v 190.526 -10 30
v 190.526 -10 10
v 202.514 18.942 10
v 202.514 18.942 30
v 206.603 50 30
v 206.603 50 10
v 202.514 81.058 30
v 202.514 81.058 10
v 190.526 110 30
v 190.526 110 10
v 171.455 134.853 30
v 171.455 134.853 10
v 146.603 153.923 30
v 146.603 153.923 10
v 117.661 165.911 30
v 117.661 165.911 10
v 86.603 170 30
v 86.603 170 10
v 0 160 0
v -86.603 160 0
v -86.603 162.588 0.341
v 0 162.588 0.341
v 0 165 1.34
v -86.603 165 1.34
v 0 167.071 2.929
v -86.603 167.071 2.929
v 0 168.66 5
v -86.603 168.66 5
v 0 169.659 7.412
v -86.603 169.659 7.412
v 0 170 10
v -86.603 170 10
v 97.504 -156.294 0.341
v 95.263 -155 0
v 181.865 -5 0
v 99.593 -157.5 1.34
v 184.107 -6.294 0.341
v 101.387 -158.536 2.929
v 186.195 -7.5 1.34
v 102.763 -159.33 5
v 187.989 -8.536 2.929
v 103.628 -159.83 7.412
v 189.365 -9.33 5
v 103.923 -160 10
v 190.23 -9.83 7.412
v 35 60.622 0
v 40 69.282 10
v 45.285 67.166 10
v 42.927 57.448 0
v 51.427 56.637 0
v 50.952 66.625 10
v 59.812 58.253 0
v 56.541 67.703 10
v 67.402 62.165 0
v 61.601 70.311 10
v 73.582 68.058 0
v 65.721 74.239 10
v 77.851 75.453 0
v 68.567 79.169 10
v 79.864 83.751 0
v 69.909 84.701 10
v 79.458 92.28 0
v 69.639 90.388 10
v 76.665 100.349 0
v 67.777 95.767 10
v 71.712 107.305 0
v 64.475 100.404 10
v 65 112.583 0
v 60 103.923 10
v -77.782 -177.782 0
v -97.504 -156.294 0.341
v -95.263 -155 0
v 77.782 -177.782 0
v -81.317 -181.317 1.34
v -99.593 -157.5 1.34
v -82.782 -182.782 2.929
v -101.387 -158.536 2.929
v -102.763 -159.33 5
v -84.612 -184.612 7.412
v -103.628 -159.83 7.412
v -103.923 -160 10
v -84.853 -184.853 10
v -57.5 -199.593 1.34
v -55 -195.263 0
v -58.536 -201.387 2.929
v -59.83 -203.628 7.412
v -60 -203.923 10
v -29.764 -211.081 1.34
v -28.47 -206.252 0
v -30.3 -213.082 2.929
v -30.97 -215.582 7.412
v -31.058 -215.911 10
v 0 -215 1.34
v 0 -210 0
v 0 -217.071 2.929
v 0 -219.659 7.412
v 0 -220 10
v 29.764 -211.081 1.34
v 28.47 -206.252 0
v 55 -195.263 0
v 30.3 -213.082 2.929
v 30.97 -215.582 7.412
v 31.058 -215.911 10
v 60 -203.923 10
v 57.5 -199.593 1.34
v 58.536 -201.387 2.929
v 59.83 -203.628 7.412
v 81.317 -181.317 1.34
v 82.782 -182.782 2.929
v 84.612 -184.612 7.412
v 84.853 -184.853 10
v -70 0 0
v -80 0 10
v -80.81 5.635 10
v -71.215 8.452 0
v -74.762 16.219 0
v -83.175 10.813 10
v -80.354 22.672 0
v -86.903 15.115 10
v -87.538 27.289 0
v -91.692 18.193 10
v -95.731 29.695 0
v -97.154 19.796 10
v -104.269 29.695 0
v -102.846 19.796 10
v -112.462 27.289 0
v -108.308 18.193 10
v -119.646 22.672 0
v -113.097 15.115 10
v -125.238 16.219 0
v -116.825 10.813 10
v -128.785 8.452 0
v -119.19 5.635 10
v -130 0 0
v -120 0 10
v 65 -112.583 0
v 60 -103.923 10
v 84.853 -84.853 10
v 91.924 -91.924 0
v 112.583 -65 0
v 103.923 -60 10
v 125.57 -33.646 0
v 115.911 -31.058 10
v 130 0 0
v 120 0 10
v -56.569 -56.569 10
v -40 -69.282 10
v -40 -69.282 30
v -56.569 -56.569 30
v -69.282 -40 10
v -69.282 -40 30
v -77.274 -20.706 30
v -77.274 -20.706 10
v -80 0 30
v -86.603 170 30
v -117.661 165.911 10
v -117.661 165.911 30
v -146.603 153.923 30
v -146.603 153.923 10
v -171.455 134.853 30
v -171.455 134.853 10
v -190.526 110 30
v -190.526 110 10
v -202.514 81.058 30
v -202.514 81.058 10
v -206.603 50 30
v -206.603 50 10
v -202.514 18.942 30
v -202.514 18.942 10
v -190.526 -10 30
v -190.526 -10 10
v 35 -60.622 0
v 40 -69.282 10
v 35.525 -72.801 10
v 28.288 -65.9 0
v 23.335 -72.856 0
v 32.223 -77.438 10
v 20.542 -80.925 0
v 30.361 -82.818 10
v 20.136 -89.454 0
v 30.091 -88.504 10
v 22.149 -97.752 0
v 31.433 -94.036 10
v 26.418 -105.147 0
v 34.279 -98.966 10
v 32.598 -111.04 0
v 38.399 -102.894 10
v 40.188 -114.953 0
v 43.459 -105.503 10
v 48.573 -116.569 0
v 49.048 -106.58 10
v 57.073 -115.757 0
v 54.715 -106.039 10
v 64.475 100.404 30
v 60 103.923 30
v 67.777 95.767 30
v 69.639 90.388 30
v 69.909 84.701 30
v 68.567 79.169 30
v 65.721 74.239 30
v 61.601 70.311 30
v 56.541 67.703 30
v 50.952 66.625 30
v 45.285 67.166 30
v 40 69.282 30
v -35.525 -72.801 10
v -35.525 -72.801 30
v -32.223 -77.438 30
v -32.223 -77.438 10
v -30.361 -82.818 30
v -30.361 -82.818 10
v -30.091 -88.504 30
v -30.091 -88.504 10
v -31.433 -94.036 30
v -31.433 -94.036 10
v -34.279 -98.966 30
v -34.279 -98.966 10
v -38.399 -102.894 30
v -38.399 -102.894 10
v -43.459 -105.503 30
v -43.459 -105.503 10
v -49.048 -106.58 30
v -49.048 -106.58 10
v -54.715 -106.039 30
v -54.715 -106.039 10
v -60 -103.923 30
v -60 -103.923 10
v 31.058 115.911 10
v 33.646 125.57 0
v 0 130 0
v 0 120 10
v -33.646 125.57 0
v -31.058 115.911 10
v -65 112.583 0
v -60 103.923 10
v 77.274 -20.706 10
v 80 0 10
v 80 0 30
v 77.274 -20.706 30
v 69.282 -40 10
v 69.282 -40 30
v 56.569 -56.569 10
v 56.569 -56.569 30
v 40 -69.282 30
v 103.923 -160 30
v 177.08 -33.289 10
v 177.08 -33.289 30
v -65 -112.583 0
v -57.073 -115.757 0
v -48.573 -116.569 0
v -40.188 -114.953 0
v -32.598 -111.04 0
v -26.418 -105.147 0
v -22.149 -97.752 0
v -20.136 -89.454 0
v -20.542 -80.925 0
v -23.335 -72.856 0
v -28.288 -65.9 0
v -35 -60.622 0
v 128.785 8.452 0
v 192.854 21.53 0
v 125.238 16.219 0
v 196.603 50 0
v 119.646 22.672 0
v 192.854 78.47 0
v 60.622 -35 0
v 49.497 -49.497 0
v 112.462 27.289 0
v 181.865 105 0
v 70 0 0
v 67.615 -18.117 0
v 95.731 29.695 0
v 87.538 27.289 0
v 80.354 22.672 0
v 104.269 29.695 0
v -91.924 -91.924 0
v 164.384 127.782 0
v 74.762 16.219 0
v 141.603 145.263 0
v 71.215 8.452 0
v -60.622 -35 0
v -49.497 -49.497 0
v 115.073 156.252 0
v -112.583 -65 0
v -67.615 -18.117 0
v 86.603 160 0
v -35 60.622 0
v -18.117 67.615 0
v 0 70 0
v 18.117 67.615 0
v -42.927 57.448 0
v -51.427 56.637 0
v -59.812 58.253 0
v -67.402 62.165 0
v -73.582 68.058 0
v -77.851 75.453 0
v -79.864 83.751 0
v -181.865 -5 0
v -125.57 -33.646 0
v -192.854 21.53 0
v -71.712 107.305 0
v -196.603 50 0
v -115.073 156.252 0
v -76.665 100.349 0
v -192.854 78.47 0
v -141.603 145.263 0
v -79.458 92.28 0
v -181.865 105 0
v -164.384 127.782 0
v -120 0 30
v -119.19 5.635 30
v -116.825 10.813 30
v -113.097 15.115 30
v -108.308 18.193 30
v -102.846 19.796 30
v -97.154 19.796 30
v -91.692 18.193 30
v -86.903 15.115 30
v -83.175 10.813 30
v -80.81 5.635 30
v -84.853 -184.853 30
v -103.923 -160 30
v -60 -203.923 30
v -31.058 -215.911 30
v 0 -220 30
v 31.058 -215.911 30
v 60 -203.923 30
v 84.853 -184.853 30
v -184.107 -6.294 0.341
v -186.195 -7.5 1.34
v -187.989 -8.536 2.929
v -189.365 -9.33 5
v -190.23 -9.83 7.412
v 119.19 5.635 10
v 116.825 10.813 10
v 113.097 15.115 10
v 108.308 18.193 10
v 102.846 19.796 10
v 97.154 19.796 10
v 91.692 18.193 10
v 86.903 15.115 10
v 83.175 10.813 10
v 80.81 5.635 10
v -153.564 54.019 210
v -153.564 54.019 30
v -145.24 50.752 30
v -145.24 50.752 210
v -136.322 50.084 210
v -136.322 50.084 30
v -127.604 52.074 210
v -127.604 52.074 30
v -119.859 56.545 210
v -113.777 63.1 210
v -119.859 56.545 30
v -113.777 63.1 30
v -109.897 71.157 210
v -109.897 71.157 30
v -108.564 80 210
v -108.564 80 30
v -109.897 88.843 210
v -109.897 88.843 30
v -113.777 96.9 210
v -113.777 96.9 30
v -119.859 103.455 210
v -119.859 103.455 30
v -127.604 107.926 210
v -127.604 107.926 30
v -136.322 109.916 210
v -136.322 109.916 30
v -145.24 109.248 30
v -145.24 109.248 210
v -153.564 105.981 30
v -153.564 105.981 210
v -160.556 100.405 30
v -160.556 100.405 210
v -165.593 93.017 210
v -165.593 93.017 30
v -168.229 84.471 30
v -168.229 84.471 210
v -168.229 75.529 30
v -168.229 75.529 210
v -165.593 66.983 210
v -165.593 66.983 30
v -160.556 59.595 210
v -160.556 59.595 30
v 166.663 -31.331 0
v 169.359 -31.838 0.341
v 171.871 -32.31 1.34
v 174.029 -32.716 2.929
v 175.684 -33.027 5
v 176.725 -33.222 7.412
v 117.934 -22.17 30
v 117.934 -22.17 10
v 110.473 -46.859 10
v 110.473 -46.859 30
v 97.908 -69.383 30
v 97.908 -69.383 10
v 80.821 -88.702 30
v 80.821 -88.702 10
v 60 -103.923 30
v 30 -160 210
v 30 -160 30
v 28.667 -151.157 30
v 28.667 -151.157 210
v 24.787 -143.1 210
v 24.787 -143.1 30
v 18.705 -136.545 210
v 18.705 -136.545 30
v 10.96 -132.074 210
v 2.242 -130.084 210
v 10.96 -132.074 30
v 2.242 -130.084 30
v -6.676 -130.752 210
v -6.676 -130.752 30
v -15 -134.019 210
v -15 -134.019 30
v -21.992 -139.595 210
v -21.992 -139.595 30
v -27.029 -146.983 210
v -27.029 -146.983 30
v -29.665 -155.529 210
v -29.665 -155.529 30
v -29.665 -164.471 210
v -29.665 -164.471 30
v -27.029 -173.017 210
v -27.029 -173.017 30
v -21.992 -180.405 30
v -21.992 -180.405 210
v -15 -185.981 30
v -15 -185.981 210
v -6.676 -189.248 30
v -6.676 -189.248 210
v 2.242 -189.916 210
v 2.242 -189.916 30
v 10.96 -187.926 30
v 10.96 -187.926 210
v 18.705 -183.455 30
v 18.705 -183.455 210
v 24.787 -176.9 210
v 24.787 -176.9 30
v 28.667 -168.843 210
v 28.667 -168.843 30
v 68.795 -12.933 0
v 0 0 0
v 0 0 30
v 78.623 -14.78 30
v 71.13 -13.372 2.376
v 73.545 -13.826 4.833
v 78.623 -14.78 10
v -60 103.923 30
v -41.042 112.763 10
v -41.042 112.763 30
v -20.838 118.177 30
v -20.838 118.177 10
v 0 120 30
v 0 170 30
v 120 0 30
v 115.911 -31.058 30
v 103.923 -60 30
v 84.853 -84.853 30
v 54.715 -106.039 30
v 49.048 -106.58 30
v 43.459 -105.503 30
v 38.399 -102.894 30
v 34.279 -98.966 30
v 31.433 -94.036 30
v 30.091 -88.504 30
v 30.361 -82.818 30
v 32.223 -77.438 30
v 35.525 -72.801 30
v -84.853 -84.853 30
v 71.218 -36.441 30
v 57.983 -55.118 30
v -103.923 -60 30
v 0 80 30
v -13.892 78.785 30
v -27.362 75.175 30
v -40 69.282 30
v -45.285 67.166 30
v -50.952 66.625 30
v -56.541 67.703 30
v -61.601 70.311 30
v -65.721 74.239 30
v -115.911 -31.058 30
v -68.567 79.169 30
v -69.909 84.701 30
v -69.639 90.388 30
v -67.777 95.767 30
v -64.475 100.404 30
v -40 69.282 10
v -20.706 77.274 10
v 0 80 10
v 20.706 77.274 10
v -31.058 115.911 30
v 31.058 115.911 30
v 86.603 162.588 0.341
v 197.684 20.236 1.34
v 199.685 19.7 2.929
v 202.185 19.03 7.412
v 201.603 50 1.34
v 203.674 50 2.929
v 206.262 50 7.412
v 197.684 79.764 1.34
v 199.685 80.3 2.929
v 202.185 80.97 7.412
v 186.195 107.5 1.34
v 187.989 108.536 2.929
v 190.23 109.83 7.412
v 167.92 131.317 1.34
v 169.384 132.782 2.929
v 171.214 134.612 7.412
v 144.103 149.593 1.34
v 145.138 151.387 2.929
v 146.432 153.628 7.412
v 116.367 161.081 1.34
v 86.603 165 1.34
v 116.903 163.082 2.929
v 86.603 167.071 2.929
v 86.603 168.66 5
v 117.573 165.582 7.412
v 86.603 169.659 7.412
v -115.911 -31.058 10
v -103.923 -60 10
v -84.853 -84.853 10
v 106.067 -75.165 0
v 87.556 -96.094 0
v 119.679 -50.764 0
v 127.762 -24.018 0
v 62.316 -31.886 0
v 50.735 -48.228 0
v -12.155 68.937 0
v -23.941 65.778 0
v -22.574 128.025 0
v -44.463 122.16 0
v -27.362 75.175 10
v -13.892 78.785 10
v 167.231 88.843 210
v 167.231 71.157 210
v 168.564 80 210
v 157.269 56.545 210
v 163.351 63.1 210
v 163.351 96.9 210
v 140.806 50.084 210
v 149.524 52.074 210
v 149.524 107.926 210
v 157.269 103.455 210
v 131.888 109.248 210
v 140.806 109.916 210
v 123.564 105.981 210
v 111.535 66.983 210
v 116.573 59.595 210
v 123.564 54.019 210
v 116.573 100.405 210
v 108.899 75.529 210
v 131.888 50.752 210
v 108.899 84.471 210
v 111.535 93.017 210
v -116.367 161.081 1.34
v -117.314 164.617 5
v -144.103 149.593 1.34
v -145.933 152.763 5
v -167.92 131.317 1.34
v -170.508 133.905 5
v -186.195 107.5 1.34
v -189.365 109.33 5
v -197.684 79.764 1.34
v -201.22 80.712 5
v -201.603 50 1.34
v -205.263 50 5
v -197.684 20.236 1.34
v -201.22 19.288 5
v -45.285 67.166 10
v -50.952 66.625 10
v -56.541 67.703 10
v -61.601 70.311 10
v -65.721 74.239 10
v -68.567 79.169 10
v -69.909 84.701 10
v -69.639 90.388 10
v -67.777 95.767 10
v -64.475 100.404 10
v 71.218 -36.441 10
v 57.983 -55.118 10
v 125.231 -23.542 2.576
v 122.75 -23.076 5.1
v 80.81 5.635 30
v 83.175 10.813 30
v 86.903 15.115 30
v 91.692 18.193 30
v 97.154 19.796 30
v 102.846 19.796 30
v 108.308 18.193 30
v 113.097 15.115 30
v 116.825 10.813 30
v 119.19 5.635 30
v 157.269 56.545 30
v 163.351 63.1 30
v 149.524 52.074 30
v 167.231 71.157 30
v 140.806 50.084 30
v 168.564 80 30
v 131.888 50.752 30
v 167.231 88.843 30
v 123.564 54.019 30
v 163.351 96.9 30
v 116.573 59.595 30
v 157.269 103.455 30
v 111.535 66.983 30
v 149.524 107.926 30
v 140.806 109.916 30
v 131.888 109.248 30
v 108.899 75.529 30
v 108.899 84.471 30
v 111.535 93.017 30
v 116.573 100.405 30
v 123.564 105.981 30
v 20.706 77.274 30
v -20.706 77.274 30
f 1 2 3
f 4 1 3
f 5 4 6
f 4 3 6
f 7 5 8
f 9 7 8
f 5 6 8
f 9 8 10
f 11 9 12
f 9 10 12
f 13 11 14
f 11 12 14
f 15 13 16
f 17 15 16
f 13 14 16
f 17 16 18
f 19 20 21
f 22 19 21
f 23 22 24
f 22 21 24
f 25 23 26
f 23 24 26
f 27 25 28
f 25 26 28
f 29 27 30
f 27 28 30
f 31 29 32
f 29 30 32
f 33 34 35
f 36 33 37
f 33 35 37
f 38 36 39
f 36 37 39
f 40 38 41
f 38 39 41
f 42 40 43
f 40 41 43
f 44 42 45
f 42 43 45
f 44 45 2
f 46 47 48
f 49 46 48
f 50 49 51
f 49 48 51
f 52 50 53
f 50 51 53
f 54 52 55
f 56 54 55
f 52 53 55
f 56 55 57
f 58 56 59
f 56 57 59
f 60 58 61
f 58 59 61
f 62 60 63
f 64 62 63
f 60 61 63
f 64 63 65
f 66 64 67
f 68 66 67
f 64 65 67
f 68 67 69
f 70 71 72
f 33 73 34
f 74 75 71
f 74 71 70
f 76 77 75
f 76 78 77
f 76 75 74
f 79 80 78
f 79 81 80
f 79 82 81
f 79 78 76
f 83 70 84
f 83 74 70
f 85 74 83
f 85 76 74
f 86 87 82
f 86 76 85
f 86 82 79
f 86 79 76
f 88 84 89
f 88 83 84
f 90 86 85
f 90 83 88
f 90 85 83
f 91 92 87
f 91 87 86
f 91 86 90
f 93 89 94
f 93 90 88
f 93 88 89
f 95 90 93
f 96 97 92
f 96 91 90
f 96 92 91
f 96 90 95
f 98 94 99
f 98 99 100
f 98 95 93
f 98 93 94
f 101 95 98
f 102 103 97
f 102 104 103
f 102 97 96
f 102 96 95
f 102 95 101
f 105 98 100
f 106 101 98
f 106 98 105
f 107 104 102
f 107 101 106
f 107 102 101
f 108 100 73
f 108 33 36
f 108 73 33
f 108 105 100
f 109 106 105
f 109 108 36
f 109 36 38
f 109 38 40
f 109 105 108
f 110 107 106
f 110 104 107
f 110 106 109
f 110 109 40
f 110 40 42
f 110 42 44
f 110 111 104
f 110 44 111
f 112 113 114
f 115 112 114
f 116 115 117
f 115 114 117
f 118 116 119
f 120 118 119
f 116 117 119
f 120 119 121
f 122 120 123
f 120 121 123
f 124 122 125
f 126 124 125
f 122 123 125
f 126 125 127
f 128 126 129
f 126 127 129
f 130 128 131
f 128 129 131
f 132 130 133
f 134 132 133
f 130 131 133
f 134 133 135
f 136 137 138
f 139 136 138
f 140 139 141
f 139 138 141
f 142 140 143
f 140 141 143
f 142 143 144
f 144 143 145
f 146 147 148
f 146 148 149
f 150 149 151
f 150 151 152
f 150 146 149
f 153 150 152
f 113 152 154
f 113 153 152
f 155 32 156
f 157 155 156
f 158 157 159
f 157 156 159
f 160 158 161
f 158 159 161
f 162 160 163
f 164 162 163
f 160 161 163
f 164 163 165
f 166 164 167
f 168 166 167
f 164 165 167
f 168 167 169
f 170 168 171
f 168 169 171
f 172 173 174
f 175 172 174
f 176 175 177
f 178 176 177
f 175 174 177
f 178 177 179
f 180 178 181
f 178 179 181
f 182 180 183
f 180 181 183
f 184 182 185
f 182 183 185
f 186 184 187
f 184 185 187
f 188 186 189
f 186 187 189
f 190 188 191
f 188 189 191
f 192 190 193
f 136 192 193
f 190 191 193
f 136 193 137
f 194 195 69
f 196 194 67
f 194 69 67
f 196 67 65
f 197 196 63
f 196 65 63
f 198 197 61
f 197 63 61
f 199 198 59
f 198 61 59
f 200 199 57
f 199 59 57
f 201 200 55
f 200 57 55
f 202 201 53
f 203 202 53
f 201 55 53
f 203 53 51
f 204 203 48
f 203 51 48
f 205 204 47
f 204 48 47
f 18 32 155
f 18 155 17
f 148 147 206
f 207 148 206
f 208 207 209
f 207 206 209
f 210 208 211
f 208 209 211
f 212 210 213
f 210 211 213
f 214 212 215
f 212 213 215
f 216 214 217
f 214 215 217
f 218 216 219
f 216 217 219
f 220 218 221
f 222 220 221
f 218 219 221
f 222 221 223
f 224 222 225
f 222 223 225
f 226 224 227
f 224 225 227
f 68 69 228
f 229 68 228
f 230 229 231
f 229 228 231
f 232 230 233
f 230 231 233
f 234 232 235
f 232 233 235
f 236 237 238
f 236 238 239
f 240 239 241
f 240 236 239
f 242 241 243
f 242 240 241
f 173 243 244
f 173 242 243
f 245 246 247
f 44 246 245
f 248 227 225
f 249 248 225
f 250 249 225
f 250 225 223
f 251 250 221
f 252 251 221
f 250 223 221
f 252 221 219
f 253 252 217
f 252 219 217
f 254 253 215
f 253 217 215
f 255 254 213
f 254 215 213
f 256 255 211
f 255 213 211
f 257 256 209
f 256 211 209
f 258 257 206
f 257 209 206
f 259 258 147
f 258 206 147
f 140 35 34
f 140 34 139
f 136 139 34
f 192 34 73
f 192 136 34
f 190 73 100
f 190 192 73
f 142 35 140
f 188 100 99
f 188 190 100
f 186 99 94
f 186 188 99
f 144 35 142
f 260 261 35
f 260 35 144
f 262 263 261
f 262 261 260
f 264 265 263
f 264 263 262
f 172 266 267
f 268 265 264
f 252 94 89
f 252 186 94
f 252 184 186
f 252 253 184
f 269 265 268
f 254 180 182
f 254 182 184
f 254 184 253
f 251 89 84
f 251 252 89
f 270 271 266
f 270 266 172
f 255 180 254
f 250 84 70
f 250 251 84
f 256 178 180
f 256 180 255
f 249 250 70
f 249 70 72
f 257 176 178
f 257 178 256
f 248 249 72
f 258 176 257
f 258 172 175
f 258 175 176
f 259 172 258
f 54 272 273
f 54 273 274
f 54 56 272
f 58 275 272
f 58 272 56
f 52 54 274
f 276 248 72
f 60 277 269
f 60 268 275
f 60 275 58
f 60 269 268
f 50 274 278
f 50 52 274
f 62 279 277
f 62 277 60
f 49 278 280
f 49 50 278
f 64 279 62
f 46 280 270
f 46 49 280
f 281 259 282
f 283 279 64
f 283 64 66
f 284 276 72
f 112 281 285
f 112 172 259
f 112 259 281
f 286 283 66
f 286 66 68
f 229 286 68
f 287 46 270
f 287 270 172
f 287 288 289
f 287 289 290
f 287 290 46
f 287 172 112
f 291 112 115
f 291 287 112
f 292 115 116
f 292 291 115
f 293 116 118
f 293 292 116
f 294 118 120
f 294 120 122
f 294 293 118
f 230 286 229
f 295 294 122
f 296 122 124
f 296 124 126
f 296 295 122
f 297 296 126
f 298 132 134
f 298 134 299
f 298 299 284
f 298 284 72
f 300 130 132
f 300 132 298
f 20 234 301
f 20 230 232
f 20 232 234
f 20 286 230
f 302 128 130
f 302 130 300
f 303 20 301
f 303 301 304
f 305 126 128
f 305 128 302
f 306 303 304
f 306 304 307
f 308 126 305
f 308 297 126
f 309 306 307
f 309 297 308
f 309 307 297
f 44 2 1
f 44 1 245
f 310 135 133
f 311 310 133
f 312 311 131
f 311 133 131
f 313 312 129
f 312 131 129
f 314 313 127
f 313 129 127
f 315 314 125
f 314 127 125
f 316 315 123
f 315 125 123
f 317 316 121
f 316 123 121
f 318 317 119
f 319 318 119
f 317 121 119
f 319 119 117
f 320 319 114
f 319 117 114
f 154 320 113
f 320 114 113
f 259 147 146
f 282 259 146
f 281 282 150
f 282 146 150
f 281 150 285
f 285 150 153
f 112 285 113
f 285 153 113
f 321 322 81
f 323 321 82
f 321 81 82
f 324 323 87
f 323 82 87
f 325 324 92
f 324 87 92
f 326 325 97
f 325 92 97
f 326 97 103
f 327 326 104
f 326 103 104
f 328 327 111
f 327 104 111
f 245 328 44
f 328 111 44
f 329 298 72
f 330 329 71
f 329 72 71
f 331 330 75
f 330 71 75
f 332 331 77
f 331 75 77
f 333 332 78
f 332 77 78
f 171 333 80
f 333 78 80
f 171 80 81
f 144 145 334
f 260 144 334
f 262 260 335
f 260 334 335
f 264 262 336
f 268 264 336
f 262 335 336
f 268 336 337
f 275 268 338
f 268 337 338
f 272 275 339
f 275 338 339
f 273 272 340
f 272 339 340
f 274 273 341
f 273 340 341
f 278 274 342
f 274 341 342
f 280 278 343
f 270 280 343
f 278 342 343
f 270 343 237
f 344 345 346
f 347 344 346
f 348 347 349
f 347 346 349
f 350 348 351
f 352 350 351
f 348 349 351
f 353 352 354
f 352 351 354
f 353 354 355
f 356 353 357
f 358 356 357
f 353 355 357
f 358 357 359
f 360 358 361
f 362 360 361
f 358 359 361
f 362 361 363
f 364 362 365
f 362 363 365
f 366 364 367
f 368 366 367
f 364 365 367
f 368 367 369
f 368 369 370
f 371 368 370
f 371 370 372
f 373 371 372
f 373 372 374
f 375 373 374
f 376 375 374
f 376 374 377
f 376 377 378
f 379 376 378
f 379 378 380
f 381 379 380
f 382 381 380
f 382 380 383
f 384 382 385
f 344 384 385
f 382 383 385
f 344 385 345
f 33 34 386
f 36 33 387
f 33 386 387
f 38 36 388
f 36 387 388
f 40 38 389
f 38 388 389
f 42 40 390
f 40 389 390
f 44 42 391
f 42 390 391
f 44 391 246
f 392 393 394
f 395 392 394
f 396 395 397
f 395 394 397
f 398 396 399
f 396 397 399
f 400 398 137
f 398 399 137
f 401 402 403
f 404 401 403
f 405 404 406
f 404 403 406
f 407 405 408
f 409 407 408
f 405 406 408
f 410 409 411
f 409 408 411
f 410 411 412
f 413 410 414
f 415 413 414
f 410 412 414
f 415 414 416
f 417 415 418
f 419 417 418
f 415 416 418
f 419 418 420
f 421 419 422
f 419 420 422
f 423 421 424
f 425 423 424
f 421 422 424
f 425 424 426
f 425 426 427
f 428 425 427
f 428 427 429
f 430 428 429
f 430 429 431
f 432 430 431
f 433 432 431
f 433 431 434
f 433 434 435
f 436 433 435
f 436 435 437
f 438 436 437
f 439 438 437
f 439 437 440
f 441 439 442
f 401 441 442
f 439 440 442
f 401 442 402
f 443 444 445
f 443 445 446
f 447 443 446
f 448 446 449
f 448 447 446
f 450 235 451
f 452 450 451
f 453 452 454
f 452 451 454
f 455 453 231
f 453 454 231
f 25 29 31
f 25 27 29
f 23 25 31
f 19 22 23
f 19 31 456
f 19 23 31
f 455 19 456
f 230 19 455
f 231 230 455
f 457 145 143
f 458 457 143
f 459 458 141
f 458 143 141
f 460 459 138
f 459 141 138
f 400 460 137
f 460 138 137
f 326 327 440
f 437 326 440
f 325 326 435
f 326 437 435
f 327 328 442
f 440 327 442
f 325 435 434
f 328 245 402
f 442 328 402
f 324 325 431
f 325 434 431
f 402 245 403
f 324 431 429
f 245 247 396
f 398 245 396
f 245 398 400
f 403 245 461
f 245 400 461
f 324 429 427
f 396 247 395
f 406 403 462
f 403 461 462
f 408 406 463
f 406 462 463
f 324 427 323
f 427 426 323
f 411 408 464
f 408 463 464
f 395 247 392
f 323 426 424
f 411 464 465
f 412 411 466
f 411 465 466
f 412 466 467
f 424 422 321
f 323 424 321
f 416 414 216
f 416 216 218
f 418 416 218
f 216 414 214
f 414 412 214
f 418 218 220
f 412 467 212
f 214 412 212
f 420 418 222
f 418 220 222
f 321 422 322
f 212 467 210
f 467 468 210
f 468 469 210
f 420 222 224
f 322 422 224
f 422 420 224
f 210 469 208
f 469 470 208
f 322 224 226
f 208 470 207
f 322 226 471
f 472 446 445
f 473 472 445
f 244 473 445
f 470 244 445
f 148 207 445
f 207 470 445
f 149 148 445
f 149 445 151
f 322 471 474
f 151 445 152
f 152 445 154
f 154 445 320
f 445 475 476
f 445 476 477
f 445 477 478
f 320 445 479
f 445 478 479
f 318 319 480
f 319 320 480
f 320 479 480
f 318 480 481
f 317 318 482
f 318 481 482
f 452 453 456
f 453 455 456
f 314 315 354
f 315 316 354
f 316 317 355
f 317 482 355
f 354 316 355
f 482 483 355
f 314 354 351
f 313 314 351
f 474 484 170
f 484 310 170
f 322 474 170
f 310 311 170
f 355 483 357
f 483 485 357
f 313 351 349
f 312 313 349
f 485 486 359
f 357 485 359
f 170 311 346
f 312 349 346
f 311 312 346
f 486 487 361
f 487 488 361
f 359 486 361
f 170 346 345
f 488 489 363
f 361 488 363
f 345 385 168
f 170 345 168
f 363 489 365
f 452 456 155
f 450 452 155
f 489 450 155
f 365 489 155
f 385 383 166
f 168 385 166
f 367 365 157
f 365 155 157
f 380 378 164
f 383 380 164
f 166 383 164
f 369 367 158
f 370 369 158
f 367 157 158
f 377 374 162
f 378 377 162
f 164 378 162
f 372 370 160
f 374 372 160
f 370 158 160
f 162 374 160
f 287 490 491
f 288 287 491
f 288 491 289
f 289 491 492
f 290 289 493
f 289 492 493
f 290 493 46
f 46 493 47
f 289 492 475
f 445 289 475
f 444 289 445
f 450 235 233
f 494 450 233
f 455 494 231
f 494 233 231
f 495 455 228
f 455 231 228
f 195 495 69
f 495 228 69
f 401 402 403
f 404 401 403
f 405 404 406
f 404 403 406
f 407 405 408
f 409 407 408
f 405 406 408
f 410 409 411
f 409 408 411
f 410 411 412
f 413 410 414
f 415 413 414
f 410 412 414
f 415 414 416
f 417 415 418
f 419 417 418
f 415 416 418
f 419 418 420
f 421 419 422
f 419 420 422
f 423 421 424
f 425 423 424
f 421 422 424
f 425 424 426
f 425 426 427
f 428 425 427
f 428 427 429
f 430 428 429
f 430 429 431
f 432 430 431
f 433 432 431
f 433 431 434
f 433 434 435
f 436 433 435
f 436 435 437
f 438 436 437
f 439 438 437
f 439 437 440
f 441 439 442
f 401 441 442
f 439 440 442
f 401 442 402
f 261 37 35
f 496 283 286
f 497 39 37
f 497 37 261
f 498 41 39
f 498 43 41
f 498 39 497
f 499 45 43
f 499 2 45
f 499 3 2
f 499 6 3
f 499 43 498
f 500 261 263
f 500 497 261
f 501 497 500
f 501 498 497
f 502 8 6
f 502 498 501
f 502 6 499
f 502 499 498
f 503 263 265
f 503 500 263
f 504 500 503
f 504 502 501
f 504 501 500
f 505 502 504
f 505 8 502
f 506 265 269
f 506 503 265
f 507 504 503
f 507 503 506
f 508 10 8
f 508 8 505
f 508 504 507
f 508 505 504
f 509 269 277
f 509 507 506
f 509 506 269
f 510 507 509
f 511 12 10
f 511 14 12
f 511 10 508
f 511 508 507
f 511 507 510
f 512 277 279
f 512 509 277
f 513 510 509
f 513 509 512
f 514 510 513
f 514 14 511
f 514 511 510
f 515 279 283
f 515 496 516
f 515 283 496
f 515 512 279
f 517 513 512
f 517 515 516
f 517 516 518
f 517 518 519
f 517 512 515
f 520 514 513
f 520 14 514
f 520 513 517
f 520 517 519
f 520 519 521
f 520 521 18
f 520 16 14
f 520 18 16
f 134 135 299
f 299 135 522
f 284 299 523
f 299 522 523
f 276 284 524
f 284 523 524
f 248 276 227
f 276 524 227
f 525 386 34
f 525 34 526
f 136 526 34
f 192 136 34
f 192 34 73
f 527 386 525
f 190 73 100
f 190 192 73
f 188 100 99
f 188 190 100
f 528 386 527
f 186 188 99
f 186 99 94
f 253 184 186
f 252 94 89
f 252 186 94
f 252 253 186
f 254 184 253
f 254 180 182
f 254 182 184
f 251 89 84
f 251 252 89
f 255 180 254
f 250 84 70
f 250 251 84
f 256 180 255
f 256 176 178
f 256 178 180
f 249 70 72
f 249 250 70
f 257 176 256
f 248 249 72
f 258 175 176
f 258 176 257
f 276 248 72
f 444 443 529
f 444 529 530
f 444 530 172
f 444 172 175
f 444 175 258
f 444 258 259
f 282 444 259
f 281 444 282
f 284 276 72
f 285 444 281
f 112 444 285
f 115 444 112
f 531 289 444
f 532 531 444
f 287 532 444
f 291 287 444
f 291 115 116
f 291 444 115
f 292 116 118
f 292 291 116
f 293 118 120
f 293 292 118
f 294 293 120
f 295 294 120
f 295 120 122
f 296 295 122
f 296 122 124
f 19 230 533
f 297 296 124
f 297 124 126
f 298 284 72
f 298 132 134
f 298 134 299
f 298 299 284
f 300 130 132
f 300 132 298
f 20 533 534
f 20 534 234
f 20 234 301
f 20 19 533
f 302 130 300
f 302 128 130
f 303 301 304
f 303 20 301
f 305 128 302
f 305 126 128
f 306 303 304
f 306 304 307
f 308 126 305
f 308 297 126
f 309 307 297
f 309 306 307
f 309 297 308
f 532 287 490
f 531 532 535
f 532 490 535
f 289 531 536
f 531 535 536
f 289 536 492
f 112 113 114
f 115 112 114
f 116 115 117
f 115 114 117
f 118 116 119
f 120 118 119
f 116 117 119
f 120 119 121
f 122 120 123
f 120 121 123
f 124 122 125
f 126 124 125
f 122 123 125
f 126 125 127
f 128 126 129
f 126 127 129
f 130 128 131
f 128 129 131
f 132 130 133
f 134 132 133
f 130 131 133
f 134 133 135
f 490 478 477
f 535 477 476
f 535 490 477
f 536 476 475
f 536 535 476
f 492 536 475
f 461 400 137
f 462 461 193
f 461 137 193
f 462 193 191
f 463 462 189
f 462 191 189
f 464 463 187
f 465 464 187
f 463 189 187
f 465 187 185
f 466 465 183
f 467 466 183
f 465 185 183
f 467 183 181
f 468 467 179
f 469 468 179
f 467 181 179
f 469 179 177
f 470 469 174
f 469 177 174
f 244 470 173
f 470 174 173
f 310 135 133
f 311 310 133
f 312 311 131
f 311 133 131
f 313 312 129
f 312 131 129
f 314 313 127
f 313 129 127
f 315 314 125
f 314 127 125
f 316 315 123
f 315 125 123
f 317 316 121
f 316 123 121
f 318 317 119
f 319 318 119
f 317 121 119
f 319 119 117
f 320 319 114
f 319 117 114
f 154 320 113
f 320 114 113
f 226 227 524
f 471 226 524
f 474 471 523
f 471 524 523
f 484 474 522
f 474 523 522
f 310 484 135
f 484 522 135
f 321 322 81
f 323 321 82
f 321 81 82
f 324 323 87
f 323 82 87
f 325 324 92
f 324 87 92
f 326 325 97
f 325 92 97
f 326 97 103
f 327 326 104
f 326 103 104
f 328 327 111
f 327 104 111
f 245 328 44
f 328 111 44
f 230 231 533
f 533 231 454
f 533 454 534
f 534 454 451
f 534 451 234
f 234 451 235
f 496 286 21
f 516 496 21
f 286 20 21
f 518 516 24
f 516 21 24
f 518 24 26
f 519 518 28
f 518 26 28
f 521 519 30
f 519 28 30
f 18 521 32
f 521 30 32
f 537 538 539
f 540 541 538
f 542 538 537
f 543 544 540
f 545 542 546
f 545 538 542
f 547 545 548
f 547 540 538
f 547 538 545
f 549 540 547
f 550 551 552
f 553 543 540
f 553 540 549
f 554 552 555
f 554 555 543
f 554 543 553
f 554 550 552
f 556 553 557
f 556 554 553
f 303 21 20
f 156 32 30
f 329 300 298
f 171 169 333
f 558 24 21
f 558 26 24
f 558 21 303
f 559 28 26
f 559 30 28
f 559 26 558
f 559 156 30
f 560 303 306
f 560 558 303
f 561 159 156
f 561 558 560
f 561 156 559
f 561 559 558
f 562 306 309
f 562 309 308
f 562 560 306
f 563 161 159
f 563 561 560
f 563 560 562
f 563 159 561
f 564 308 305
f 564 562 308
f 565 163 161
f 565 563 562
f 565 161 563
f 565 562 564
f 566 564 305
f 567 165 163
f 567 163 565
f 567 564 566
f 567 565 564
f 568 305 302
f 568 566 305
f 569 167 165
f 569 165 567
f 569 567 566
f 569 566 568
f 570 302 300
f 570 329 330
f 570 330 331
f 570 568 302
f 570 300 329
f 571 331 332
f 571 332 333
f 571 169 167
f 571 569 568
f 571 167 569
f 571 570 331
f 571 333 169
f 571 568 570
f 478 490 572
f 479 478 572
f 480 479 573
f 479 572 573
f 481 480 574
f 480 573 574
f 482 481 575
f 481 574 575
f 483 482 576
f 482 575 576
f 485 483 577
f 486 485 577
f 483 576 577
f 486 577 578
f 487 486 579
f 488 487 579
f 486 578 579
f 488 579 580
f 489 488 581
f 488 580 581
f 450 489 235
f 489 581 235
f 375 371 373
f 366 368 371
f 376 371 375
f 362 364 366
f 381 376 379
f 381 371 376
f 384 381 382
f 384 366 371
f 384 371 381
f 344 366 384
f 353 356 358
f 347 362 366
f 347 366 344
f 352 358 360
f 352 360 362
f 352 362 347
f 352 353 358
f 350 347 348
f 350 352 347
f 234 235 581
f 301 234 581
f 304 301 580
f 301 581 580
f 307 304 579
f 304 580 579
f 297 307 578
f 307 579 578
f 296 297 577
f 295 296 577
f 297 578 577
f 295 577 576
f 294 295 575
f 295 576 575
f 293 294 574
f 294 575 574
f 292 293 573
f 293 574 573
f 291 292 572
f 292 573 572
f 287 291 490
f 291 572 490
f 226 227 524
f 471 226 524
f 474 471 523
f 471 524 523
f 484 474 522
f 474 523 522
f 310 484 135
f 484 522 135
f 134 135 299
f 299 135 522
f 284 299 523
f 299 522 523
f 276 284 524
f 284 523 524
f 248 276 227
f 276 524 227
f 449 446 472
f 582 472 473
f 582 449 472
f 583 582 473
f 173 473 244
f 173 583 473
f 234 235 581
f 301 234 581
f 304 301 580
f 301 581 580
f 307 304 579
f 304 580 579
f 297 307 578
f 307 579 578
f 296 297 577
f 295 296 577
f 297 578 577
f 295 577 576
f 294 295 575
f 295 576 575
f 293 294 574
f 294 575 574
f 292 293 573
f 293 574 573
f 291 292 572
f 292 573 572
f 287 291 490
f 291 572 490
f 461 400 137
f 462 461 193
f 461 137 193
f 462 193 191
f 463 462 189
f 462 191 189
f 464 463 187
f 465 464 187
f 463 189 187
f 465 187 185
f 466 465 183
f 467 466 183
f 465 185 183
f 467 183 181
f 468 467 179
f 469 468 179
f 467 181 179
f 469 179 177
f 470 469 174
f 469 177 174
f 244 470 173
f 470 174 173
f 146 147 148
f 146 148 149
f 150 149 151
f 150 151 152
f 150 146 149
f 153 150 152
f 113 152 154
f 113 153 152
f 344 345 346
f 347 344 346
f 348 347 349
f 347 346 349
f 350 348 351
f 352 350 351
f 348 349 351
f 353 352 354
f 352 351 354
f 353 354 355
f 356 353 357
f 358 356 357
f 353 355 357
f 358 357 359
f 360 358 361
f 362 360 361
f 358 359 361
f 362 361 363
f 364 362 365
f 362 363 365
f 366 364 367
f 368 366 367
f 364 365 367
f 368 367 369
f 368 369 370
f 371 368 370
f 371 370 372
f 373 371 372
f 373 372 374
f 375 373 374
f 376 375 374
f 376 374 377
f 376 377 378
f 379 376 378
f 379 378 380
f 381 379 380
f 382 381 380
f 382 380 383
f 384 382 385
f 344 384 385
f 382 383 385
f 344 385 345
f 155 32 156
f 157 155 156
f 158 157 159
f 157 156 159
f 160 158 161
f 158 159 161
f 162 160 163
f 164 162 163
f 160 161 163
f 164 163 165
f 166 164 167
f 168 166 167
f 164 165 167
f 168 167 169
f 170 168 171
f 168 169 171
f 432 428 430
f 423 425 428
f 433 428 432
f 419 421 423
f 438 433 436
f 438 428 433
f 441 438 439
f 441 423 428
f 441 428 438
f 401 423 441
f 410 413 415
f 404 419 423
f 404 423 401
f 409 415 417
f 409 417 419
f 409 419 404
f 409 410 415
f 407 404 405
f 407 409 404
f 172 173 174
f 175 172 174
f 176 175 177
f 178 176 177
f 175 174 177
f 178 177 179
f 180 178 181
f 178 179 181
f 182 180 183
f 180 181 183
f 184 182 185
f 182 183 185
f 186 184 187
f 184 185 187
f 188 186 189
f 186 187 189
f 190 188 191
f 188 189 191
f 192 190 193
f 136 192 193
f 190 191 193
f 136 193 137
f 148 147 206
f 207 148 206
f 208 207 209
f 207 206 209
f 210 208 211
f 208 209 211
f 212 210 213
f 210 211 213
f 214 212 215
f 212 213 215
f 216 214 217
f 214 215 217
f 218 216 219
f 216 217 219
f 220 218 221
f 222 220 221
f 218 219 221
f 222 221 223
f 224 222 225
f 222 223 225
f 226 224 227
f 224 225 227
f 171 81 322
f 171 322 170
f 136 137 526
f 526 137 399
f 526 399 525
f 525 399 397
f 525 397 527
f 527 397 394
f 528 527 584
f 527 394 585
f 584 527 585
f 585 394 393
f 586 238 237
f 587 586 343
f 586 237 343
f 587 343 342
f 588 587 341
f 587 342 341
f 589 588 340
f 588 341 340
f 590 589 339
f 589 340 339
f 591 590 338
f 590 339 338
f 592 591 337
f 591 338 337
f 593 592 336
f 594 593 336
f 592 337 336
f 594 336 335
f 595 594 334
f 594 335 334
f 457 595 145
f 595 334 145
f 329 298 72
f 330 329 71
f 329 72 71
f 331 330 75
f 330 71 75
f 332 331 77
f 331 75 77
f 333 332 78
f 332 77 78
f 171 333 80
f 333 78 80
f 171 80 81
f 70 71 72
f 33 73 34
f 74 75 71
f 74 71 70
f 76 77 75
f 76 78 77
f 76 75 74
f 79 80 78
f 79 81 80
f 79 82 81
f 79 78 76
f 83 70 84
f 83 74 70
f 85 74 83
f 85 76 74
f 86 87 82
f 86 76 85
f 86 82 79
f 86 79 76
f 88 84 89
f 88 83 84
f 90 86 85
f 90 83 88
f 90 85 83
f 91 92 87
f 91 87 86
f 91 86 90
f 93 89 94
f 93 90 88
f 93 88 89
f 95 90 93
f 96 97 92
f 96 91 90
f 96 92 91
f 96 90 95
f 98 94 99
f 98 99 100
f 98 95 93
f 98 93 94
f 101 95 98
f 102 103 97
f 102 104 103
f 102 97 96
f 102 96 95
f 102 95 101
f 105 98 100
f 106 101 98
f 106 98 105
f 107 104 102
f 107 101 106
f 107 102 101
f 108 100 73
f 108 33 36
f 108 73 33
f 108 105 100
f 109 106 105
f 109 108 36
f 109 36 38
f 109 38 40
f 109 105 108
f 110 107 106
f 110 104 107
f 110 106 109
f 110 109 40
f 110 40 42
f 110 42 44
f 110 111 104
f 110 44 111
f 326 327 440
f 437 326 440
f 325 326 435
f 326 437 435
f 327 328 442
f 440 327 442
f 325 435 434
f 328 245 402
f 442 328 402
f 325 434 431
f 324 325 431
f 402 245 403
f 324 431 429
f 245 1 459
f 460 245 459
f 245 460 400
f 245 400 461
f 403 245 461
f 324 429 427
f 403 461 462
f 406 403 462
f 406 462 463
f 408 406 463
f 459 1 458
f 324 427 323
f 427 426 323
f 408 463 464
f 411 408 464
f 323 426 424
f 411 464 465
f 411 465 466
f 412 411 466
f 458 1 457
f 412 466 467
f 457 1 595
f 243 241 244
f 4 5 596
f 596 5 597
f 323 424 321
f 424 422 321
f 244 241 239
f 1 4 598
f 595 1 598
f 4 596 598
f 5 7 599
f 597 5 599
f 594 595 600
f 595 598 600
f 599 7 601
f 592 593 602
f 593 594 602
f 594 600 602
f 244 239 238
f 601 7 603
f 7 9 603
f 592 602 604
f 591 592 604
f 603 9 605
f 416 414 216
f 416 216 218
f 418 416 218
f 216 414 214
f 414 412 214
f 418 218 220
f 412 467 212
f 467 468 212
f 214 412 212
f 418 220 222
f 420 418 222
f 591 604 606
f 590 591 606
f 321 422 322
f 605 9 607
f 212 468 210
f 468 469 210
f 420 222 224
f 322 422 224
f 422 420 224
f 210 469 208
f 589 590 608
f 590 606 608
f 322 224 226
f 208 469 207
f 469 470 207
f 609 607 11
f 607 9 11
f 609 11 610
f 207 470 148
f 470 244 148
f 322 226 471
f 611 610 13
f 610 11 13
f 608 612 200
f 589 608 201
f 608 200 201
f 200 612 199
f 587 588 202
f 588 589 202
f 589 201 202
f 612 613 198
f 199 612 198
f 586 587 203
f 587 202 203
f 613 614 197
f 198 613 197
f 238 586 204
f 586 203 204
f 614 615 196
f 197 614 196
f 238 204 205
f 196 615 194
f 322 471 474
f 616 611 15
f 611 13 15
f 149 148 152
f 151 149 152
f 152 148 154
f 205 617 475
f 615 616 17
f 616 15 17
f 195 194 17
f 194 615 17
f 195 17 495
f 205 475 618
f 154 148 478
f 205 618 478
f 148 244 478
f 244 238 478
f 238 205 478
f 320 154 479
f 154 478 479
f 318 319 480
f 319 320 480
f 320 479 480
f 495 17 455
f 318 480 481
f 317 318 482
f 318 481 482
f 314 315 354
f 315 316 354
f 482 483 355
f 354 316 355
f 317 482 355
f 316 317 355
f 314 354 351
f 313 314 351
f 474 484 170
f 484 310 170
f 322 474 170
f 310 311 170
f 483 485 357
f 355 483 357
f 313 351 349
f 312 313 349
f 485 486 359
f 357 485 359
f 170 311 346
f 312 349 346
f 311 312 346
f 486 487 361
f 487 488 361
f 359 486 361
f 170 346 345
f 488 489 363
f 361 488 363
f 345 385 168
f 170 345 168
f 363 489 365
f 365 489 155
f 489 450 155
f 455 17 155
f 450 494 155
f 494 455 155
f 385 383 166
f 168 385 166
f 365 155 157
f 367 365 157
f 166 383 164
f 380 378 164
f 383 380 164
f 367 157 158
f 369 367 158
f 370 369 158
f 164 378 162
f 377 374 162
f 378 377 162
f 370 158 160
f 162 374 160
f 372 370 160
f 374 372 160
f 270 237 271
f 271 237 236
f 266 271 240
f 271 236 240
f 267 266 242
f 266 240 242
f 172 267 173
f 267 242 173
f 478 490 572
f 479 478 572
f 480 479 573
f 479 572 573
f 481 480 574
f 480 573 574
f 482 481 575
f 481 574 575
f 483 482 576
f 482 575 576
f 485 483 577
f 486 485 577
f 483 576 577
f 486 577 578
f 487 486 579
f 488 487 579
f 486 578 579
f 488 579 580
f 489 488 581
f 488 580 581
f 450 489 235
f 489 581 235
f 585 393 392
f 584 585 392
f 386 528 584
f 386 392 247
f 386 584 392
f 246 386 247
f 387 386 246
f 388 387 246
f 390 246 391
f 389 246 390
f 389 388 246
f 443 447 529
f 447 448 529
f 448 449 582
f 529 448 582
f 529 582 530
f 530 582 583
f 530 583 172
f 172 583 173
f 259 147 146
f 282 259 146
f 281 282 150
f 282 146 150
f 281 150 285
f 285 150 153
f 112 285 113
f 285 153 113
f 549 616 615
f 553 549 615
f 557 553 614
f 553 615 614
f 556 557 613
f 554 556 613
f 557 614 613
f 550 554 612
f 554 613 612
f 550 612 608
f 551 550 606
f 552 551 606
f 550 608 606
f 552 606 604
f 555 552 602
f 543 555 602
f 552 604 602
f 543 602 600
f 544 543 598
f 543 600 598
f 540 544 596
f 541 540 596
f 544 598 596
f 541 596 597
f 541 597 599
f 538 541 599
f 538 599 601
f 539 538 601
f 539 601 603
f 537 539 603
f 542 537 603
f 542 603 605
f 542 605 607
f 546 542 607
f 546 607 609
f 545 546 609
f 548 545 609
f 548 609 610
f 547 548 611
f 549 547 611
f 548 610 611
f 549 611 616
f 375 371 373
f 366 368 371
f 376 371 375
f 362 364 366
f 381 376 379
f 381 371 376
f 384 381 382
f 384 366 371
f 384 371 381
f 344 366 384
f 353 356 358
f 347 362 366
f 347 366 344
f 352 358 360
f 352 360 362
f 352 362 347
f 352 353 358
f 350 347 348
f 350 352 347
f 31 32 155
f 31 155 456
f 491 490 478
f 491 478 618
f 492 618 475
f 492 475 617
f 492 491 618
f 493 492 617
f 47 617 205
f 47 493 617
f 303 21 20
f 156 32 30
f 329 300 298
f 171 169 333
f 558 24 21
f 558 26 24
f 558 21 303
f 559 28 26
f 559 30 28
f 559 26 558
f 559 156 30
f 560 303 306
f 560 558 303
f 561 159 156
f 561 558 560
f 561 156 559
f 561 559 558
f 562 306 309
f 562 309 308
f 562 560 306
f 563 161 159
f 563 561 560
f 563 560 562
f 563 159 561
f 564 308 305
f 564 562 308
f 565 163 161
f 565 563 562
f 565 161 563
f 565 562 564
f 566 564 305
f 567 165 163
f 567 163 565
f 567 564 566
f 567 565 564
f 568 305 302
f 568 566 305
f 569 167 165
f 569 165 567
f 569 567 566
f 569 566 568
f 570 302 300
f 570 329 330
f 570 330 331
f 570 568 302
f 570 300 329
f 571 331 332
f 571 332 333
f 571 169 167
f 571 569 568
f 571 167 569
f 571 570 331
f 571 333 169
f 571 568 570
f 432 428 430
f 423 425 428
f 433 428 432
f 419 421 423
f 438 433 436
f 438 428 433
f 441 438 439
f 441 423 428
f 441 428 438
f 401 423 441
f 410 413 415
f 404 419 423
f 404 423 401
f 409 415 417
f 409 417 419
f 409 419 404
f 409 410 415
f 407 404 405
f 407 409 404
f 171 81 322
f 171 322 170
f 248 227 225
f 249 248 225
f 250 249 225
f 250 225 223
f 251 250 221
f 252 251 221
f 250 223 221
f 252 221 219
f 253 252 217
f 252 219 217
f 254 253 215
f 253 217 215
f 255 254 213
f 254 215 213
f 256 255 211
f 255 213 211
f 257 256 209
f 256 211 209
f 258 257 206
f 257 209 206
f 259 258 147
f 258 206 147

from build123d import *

# Parameters (mm, degrees)
PAD_DEPTH             = 30
POCKET_DEPTH          = 1167.961349
POLARPATTERN_COUNT    = 3
FILLET_R              = 10
CHAMFER_SIZE          = 10
SKETCH002_R           = 30
PAD001_DEPTH          = 180
POLARPATTERN001_COUNT = 3
POCKET001_DEPTH       = 210.001
PAD003_DEPTH          = 30
POCKET002_DEPTH       = 1167.961349
POLARPATTERN002_COUNT = 3
FILLET001_R           = 10
CHAMFER001_SIZE       = 10
SKETCH006_R           = 30
PAD002_DEPTH          = 180
POLARPATTERN003_COUNT = 3


with BuildPart() as body:
    # Sketch → Pad (new body)
    with BuildSketch(Plane.XY):
        with BuildLine():
            Line((190.525589, -10), (103.923048, -160))
            ThreePointArc((-103.923048, -160), (0, -220), (103.923048, -160))
            Line((-103.923048, -160), (-190.525589, -10))
            ThreePointArc((-86.60254, 170), (-190.525589, 110), (-190.525589, -10))
            Line((-86.60254, 170), (86.60254, 170))
            ThreePointArc((190.525589, -10), (190.525589, 110), (86.60254, 170))
        make_face()
    extrude(amount=PAD_DEPTH)

    # Sketch001 (on Face7 of Pad) → Pocket (cut, through all)
    with BuildSketch(Plane(origin=(0, 0, 0), x_dir=(1, 0, 0), z_dir=(0, 0, -1))):
        with BuildLine():
            ThreePointArc((-40, -69.282032), (0, -80), (40, -69.282032))
            ThreePointArc((60, -103.923048), (67.320508, -76.60254), (40, -69.282032))
            ThreePointArc((-60, -103.923048), (0, -120), (60, -103.923048))
            ThreePointArc((-40, -69.282032), (-67.320508, -76.60254), (-60, -103.923048))
        make_face()
    pocket = extrude(amount=-POCKET_DEPTH, mode=Mode.SUBTRACT)

    # PolarPattern: Pocket ×3 about axis
    polarpattern_axis = Axis((0, 0, 0), (0, 0, -1))
    for i in range(1, POLARPATTERN_COUNT):
        add(pocket.rotate(polarpattern_axis, i * 360 / POLARPATTERN_COUNT), mode=Mode.SUBTRACT)

    # Fillet
    fillet_edges = [body.edges().sort_by_distance(p)[0] for p in [
        (-190.525589, 110, 0),
        (0, -220, 0),
        (190.525589, 110, 0),
    ]]
    fillet(fillet_edges, radius=FILLET_R)

    # Chamfer
    chamfer_edges = [body.edges().sort_by_distance(p)[0] for p in [
        (69.282032, -40, 0),
        (103.923048, -60, 0),
        (0, 80, 0),
        (0, 120, 0),
        (-69.282032, -40, 0),
        (-103.923048, -60, 0),
    ]]
    chamfer(chamfer_edges, length=CHAMFER_SIZE)

    # Sketch002 (on Face38 of Chamfer) → Pad001 (join)
    with BuildSketch(Plane.XY.offset(30)):
        with Locations((0, -160)):
            Circle(SKETCH002_R)
    pad001 = extrude(amount=PAD001_DEPTH)

    # PolarPattern001: Pad001 ×3 about axis
    polarpattern001_axis = Axis((0, 0, 30), (0, 0, 1))
    for i in range(1, POLARPATTERN001_COUNT):
        add(pad001.rotate(polarpattern001_axis, i * 360 / POLARPATTERN001_COUNT))

    # Sketch003 (on Face1 of PolarPattern001) → Pocket001 (cut, through all)
    with BuildSketch(Plane(origin=(0, 0, 0), x_dir=(1, 0, 0), z_dir=(0, 0, -1))):
        Polygon((0, 0), (382.591034, 71.92334), (0, -354.096375), align=None)
    extrude(amount=-POCKET001_DEPTH, mode=Mode.SUBTRACT)


with BuildPart() as polarpattern003:
    # Sketch005 → Pad003 (new body)
    with BuildSketch(Plane.XY):
        with BuildLine():
            Line((190.525589, -10), (103.923048, -160))
            ThreePointArc((-103.923048, -160), (0, -220), (103.923048, -160))
            Line((-103.923048, -160), (-190.525589, -10))
            ThreePointArc((-86.60254, 170), (-190.525589, 110), (-190.525589, -10))
            Line((-86.60254, 170), (86.60254, 170))
            ThreePointArc((190.525589, -10), (190.525589, 110), (86.60254, 170))
        make_face()
    extrude(amount=PAD003_DEPTH)

    # Sketch004 (on Face7 of Pad003) → Pocket002 (cut, through all)
    with BuildSketch(Plane(origin=(0, 0, 0), x_dir=(1, 0, 0), z_dir=(0, 0, -1))):
        with BuildLine():
            ThreePointArc((-40, -69.282032), (0, -80), (40, -69.282032))
            ThreePointArc((60, -103.923048), (67.320508, -76.60254), (40, -69.282032))
            ThreePointArc((-60, -103.923048), (0, -120), (60, -103.923048))
            ThreePointArc((-40, -69.282032), (-67.320508, -76.60254), (-60, -103.923048))
        make_face()
    pocket002 = extrude(amount=-POCKET002_DEPTH, mode=Mode.SUBTRACT)

    # PolarPattern002: Pocket002 ×3 about axis
    polarpattern002_axis = Axis((0, 0, 0), (0, 0, -1))
    for i in range(1, POLARPATTERN002_COUNT):
        add(pocket002.rotate(polarpattern002_axis, i * 360 / POLARPATTERN002_COUNT), mode=Mode.SUBTRACT)

    # Fillet001
    fillet001_edges = [polarpattern003.edges().sort_by_distance(p)[0] for p in [
        (-190.525589, 110, 0),
        (0, -220, 0),
        (190.525589, 110, 0),
    ]]
    fillet(fillet001_edges, radius=FILLET001_R)

    # Chamfer001
    chamfer001_edges = [polarpattern003.edges().sort_by_distance(p)[0] for p in [
        (69.282032, -40, 0),
        (103.923048, -60, 0),
        (0, 80, 0),
        (0, 120, 0),
        (-69.282032, -40, 0),
        (-103.923048, -60, 0),
    ]]
    chamfer(chamfer001_edges, length=CHAMFER001_SIZE)

    # Sketch006 (on Face38 of Chamfer001) → Pad002 (new body)
    with BuildSketch(Plane.XY.offset(30)):
        with Locations((0, -160)):
            Circle(SKETCH006_R)
    pad002 = extrude(amount=PAD002_DEPTH)

    # PolarPattern003: Pad002 ×3 about axis
    polarpattern003_axis = Axis((0, 0, 30), (0, 0, 1))
    for i in range(1, POLARPATTERN003_COUNT):
        add(pad002.rotate(polarpattern003_axis, i * 360 / POLARPATTERN003_COUNT))


solid = Compound([body.part, polarpattern003.part])
